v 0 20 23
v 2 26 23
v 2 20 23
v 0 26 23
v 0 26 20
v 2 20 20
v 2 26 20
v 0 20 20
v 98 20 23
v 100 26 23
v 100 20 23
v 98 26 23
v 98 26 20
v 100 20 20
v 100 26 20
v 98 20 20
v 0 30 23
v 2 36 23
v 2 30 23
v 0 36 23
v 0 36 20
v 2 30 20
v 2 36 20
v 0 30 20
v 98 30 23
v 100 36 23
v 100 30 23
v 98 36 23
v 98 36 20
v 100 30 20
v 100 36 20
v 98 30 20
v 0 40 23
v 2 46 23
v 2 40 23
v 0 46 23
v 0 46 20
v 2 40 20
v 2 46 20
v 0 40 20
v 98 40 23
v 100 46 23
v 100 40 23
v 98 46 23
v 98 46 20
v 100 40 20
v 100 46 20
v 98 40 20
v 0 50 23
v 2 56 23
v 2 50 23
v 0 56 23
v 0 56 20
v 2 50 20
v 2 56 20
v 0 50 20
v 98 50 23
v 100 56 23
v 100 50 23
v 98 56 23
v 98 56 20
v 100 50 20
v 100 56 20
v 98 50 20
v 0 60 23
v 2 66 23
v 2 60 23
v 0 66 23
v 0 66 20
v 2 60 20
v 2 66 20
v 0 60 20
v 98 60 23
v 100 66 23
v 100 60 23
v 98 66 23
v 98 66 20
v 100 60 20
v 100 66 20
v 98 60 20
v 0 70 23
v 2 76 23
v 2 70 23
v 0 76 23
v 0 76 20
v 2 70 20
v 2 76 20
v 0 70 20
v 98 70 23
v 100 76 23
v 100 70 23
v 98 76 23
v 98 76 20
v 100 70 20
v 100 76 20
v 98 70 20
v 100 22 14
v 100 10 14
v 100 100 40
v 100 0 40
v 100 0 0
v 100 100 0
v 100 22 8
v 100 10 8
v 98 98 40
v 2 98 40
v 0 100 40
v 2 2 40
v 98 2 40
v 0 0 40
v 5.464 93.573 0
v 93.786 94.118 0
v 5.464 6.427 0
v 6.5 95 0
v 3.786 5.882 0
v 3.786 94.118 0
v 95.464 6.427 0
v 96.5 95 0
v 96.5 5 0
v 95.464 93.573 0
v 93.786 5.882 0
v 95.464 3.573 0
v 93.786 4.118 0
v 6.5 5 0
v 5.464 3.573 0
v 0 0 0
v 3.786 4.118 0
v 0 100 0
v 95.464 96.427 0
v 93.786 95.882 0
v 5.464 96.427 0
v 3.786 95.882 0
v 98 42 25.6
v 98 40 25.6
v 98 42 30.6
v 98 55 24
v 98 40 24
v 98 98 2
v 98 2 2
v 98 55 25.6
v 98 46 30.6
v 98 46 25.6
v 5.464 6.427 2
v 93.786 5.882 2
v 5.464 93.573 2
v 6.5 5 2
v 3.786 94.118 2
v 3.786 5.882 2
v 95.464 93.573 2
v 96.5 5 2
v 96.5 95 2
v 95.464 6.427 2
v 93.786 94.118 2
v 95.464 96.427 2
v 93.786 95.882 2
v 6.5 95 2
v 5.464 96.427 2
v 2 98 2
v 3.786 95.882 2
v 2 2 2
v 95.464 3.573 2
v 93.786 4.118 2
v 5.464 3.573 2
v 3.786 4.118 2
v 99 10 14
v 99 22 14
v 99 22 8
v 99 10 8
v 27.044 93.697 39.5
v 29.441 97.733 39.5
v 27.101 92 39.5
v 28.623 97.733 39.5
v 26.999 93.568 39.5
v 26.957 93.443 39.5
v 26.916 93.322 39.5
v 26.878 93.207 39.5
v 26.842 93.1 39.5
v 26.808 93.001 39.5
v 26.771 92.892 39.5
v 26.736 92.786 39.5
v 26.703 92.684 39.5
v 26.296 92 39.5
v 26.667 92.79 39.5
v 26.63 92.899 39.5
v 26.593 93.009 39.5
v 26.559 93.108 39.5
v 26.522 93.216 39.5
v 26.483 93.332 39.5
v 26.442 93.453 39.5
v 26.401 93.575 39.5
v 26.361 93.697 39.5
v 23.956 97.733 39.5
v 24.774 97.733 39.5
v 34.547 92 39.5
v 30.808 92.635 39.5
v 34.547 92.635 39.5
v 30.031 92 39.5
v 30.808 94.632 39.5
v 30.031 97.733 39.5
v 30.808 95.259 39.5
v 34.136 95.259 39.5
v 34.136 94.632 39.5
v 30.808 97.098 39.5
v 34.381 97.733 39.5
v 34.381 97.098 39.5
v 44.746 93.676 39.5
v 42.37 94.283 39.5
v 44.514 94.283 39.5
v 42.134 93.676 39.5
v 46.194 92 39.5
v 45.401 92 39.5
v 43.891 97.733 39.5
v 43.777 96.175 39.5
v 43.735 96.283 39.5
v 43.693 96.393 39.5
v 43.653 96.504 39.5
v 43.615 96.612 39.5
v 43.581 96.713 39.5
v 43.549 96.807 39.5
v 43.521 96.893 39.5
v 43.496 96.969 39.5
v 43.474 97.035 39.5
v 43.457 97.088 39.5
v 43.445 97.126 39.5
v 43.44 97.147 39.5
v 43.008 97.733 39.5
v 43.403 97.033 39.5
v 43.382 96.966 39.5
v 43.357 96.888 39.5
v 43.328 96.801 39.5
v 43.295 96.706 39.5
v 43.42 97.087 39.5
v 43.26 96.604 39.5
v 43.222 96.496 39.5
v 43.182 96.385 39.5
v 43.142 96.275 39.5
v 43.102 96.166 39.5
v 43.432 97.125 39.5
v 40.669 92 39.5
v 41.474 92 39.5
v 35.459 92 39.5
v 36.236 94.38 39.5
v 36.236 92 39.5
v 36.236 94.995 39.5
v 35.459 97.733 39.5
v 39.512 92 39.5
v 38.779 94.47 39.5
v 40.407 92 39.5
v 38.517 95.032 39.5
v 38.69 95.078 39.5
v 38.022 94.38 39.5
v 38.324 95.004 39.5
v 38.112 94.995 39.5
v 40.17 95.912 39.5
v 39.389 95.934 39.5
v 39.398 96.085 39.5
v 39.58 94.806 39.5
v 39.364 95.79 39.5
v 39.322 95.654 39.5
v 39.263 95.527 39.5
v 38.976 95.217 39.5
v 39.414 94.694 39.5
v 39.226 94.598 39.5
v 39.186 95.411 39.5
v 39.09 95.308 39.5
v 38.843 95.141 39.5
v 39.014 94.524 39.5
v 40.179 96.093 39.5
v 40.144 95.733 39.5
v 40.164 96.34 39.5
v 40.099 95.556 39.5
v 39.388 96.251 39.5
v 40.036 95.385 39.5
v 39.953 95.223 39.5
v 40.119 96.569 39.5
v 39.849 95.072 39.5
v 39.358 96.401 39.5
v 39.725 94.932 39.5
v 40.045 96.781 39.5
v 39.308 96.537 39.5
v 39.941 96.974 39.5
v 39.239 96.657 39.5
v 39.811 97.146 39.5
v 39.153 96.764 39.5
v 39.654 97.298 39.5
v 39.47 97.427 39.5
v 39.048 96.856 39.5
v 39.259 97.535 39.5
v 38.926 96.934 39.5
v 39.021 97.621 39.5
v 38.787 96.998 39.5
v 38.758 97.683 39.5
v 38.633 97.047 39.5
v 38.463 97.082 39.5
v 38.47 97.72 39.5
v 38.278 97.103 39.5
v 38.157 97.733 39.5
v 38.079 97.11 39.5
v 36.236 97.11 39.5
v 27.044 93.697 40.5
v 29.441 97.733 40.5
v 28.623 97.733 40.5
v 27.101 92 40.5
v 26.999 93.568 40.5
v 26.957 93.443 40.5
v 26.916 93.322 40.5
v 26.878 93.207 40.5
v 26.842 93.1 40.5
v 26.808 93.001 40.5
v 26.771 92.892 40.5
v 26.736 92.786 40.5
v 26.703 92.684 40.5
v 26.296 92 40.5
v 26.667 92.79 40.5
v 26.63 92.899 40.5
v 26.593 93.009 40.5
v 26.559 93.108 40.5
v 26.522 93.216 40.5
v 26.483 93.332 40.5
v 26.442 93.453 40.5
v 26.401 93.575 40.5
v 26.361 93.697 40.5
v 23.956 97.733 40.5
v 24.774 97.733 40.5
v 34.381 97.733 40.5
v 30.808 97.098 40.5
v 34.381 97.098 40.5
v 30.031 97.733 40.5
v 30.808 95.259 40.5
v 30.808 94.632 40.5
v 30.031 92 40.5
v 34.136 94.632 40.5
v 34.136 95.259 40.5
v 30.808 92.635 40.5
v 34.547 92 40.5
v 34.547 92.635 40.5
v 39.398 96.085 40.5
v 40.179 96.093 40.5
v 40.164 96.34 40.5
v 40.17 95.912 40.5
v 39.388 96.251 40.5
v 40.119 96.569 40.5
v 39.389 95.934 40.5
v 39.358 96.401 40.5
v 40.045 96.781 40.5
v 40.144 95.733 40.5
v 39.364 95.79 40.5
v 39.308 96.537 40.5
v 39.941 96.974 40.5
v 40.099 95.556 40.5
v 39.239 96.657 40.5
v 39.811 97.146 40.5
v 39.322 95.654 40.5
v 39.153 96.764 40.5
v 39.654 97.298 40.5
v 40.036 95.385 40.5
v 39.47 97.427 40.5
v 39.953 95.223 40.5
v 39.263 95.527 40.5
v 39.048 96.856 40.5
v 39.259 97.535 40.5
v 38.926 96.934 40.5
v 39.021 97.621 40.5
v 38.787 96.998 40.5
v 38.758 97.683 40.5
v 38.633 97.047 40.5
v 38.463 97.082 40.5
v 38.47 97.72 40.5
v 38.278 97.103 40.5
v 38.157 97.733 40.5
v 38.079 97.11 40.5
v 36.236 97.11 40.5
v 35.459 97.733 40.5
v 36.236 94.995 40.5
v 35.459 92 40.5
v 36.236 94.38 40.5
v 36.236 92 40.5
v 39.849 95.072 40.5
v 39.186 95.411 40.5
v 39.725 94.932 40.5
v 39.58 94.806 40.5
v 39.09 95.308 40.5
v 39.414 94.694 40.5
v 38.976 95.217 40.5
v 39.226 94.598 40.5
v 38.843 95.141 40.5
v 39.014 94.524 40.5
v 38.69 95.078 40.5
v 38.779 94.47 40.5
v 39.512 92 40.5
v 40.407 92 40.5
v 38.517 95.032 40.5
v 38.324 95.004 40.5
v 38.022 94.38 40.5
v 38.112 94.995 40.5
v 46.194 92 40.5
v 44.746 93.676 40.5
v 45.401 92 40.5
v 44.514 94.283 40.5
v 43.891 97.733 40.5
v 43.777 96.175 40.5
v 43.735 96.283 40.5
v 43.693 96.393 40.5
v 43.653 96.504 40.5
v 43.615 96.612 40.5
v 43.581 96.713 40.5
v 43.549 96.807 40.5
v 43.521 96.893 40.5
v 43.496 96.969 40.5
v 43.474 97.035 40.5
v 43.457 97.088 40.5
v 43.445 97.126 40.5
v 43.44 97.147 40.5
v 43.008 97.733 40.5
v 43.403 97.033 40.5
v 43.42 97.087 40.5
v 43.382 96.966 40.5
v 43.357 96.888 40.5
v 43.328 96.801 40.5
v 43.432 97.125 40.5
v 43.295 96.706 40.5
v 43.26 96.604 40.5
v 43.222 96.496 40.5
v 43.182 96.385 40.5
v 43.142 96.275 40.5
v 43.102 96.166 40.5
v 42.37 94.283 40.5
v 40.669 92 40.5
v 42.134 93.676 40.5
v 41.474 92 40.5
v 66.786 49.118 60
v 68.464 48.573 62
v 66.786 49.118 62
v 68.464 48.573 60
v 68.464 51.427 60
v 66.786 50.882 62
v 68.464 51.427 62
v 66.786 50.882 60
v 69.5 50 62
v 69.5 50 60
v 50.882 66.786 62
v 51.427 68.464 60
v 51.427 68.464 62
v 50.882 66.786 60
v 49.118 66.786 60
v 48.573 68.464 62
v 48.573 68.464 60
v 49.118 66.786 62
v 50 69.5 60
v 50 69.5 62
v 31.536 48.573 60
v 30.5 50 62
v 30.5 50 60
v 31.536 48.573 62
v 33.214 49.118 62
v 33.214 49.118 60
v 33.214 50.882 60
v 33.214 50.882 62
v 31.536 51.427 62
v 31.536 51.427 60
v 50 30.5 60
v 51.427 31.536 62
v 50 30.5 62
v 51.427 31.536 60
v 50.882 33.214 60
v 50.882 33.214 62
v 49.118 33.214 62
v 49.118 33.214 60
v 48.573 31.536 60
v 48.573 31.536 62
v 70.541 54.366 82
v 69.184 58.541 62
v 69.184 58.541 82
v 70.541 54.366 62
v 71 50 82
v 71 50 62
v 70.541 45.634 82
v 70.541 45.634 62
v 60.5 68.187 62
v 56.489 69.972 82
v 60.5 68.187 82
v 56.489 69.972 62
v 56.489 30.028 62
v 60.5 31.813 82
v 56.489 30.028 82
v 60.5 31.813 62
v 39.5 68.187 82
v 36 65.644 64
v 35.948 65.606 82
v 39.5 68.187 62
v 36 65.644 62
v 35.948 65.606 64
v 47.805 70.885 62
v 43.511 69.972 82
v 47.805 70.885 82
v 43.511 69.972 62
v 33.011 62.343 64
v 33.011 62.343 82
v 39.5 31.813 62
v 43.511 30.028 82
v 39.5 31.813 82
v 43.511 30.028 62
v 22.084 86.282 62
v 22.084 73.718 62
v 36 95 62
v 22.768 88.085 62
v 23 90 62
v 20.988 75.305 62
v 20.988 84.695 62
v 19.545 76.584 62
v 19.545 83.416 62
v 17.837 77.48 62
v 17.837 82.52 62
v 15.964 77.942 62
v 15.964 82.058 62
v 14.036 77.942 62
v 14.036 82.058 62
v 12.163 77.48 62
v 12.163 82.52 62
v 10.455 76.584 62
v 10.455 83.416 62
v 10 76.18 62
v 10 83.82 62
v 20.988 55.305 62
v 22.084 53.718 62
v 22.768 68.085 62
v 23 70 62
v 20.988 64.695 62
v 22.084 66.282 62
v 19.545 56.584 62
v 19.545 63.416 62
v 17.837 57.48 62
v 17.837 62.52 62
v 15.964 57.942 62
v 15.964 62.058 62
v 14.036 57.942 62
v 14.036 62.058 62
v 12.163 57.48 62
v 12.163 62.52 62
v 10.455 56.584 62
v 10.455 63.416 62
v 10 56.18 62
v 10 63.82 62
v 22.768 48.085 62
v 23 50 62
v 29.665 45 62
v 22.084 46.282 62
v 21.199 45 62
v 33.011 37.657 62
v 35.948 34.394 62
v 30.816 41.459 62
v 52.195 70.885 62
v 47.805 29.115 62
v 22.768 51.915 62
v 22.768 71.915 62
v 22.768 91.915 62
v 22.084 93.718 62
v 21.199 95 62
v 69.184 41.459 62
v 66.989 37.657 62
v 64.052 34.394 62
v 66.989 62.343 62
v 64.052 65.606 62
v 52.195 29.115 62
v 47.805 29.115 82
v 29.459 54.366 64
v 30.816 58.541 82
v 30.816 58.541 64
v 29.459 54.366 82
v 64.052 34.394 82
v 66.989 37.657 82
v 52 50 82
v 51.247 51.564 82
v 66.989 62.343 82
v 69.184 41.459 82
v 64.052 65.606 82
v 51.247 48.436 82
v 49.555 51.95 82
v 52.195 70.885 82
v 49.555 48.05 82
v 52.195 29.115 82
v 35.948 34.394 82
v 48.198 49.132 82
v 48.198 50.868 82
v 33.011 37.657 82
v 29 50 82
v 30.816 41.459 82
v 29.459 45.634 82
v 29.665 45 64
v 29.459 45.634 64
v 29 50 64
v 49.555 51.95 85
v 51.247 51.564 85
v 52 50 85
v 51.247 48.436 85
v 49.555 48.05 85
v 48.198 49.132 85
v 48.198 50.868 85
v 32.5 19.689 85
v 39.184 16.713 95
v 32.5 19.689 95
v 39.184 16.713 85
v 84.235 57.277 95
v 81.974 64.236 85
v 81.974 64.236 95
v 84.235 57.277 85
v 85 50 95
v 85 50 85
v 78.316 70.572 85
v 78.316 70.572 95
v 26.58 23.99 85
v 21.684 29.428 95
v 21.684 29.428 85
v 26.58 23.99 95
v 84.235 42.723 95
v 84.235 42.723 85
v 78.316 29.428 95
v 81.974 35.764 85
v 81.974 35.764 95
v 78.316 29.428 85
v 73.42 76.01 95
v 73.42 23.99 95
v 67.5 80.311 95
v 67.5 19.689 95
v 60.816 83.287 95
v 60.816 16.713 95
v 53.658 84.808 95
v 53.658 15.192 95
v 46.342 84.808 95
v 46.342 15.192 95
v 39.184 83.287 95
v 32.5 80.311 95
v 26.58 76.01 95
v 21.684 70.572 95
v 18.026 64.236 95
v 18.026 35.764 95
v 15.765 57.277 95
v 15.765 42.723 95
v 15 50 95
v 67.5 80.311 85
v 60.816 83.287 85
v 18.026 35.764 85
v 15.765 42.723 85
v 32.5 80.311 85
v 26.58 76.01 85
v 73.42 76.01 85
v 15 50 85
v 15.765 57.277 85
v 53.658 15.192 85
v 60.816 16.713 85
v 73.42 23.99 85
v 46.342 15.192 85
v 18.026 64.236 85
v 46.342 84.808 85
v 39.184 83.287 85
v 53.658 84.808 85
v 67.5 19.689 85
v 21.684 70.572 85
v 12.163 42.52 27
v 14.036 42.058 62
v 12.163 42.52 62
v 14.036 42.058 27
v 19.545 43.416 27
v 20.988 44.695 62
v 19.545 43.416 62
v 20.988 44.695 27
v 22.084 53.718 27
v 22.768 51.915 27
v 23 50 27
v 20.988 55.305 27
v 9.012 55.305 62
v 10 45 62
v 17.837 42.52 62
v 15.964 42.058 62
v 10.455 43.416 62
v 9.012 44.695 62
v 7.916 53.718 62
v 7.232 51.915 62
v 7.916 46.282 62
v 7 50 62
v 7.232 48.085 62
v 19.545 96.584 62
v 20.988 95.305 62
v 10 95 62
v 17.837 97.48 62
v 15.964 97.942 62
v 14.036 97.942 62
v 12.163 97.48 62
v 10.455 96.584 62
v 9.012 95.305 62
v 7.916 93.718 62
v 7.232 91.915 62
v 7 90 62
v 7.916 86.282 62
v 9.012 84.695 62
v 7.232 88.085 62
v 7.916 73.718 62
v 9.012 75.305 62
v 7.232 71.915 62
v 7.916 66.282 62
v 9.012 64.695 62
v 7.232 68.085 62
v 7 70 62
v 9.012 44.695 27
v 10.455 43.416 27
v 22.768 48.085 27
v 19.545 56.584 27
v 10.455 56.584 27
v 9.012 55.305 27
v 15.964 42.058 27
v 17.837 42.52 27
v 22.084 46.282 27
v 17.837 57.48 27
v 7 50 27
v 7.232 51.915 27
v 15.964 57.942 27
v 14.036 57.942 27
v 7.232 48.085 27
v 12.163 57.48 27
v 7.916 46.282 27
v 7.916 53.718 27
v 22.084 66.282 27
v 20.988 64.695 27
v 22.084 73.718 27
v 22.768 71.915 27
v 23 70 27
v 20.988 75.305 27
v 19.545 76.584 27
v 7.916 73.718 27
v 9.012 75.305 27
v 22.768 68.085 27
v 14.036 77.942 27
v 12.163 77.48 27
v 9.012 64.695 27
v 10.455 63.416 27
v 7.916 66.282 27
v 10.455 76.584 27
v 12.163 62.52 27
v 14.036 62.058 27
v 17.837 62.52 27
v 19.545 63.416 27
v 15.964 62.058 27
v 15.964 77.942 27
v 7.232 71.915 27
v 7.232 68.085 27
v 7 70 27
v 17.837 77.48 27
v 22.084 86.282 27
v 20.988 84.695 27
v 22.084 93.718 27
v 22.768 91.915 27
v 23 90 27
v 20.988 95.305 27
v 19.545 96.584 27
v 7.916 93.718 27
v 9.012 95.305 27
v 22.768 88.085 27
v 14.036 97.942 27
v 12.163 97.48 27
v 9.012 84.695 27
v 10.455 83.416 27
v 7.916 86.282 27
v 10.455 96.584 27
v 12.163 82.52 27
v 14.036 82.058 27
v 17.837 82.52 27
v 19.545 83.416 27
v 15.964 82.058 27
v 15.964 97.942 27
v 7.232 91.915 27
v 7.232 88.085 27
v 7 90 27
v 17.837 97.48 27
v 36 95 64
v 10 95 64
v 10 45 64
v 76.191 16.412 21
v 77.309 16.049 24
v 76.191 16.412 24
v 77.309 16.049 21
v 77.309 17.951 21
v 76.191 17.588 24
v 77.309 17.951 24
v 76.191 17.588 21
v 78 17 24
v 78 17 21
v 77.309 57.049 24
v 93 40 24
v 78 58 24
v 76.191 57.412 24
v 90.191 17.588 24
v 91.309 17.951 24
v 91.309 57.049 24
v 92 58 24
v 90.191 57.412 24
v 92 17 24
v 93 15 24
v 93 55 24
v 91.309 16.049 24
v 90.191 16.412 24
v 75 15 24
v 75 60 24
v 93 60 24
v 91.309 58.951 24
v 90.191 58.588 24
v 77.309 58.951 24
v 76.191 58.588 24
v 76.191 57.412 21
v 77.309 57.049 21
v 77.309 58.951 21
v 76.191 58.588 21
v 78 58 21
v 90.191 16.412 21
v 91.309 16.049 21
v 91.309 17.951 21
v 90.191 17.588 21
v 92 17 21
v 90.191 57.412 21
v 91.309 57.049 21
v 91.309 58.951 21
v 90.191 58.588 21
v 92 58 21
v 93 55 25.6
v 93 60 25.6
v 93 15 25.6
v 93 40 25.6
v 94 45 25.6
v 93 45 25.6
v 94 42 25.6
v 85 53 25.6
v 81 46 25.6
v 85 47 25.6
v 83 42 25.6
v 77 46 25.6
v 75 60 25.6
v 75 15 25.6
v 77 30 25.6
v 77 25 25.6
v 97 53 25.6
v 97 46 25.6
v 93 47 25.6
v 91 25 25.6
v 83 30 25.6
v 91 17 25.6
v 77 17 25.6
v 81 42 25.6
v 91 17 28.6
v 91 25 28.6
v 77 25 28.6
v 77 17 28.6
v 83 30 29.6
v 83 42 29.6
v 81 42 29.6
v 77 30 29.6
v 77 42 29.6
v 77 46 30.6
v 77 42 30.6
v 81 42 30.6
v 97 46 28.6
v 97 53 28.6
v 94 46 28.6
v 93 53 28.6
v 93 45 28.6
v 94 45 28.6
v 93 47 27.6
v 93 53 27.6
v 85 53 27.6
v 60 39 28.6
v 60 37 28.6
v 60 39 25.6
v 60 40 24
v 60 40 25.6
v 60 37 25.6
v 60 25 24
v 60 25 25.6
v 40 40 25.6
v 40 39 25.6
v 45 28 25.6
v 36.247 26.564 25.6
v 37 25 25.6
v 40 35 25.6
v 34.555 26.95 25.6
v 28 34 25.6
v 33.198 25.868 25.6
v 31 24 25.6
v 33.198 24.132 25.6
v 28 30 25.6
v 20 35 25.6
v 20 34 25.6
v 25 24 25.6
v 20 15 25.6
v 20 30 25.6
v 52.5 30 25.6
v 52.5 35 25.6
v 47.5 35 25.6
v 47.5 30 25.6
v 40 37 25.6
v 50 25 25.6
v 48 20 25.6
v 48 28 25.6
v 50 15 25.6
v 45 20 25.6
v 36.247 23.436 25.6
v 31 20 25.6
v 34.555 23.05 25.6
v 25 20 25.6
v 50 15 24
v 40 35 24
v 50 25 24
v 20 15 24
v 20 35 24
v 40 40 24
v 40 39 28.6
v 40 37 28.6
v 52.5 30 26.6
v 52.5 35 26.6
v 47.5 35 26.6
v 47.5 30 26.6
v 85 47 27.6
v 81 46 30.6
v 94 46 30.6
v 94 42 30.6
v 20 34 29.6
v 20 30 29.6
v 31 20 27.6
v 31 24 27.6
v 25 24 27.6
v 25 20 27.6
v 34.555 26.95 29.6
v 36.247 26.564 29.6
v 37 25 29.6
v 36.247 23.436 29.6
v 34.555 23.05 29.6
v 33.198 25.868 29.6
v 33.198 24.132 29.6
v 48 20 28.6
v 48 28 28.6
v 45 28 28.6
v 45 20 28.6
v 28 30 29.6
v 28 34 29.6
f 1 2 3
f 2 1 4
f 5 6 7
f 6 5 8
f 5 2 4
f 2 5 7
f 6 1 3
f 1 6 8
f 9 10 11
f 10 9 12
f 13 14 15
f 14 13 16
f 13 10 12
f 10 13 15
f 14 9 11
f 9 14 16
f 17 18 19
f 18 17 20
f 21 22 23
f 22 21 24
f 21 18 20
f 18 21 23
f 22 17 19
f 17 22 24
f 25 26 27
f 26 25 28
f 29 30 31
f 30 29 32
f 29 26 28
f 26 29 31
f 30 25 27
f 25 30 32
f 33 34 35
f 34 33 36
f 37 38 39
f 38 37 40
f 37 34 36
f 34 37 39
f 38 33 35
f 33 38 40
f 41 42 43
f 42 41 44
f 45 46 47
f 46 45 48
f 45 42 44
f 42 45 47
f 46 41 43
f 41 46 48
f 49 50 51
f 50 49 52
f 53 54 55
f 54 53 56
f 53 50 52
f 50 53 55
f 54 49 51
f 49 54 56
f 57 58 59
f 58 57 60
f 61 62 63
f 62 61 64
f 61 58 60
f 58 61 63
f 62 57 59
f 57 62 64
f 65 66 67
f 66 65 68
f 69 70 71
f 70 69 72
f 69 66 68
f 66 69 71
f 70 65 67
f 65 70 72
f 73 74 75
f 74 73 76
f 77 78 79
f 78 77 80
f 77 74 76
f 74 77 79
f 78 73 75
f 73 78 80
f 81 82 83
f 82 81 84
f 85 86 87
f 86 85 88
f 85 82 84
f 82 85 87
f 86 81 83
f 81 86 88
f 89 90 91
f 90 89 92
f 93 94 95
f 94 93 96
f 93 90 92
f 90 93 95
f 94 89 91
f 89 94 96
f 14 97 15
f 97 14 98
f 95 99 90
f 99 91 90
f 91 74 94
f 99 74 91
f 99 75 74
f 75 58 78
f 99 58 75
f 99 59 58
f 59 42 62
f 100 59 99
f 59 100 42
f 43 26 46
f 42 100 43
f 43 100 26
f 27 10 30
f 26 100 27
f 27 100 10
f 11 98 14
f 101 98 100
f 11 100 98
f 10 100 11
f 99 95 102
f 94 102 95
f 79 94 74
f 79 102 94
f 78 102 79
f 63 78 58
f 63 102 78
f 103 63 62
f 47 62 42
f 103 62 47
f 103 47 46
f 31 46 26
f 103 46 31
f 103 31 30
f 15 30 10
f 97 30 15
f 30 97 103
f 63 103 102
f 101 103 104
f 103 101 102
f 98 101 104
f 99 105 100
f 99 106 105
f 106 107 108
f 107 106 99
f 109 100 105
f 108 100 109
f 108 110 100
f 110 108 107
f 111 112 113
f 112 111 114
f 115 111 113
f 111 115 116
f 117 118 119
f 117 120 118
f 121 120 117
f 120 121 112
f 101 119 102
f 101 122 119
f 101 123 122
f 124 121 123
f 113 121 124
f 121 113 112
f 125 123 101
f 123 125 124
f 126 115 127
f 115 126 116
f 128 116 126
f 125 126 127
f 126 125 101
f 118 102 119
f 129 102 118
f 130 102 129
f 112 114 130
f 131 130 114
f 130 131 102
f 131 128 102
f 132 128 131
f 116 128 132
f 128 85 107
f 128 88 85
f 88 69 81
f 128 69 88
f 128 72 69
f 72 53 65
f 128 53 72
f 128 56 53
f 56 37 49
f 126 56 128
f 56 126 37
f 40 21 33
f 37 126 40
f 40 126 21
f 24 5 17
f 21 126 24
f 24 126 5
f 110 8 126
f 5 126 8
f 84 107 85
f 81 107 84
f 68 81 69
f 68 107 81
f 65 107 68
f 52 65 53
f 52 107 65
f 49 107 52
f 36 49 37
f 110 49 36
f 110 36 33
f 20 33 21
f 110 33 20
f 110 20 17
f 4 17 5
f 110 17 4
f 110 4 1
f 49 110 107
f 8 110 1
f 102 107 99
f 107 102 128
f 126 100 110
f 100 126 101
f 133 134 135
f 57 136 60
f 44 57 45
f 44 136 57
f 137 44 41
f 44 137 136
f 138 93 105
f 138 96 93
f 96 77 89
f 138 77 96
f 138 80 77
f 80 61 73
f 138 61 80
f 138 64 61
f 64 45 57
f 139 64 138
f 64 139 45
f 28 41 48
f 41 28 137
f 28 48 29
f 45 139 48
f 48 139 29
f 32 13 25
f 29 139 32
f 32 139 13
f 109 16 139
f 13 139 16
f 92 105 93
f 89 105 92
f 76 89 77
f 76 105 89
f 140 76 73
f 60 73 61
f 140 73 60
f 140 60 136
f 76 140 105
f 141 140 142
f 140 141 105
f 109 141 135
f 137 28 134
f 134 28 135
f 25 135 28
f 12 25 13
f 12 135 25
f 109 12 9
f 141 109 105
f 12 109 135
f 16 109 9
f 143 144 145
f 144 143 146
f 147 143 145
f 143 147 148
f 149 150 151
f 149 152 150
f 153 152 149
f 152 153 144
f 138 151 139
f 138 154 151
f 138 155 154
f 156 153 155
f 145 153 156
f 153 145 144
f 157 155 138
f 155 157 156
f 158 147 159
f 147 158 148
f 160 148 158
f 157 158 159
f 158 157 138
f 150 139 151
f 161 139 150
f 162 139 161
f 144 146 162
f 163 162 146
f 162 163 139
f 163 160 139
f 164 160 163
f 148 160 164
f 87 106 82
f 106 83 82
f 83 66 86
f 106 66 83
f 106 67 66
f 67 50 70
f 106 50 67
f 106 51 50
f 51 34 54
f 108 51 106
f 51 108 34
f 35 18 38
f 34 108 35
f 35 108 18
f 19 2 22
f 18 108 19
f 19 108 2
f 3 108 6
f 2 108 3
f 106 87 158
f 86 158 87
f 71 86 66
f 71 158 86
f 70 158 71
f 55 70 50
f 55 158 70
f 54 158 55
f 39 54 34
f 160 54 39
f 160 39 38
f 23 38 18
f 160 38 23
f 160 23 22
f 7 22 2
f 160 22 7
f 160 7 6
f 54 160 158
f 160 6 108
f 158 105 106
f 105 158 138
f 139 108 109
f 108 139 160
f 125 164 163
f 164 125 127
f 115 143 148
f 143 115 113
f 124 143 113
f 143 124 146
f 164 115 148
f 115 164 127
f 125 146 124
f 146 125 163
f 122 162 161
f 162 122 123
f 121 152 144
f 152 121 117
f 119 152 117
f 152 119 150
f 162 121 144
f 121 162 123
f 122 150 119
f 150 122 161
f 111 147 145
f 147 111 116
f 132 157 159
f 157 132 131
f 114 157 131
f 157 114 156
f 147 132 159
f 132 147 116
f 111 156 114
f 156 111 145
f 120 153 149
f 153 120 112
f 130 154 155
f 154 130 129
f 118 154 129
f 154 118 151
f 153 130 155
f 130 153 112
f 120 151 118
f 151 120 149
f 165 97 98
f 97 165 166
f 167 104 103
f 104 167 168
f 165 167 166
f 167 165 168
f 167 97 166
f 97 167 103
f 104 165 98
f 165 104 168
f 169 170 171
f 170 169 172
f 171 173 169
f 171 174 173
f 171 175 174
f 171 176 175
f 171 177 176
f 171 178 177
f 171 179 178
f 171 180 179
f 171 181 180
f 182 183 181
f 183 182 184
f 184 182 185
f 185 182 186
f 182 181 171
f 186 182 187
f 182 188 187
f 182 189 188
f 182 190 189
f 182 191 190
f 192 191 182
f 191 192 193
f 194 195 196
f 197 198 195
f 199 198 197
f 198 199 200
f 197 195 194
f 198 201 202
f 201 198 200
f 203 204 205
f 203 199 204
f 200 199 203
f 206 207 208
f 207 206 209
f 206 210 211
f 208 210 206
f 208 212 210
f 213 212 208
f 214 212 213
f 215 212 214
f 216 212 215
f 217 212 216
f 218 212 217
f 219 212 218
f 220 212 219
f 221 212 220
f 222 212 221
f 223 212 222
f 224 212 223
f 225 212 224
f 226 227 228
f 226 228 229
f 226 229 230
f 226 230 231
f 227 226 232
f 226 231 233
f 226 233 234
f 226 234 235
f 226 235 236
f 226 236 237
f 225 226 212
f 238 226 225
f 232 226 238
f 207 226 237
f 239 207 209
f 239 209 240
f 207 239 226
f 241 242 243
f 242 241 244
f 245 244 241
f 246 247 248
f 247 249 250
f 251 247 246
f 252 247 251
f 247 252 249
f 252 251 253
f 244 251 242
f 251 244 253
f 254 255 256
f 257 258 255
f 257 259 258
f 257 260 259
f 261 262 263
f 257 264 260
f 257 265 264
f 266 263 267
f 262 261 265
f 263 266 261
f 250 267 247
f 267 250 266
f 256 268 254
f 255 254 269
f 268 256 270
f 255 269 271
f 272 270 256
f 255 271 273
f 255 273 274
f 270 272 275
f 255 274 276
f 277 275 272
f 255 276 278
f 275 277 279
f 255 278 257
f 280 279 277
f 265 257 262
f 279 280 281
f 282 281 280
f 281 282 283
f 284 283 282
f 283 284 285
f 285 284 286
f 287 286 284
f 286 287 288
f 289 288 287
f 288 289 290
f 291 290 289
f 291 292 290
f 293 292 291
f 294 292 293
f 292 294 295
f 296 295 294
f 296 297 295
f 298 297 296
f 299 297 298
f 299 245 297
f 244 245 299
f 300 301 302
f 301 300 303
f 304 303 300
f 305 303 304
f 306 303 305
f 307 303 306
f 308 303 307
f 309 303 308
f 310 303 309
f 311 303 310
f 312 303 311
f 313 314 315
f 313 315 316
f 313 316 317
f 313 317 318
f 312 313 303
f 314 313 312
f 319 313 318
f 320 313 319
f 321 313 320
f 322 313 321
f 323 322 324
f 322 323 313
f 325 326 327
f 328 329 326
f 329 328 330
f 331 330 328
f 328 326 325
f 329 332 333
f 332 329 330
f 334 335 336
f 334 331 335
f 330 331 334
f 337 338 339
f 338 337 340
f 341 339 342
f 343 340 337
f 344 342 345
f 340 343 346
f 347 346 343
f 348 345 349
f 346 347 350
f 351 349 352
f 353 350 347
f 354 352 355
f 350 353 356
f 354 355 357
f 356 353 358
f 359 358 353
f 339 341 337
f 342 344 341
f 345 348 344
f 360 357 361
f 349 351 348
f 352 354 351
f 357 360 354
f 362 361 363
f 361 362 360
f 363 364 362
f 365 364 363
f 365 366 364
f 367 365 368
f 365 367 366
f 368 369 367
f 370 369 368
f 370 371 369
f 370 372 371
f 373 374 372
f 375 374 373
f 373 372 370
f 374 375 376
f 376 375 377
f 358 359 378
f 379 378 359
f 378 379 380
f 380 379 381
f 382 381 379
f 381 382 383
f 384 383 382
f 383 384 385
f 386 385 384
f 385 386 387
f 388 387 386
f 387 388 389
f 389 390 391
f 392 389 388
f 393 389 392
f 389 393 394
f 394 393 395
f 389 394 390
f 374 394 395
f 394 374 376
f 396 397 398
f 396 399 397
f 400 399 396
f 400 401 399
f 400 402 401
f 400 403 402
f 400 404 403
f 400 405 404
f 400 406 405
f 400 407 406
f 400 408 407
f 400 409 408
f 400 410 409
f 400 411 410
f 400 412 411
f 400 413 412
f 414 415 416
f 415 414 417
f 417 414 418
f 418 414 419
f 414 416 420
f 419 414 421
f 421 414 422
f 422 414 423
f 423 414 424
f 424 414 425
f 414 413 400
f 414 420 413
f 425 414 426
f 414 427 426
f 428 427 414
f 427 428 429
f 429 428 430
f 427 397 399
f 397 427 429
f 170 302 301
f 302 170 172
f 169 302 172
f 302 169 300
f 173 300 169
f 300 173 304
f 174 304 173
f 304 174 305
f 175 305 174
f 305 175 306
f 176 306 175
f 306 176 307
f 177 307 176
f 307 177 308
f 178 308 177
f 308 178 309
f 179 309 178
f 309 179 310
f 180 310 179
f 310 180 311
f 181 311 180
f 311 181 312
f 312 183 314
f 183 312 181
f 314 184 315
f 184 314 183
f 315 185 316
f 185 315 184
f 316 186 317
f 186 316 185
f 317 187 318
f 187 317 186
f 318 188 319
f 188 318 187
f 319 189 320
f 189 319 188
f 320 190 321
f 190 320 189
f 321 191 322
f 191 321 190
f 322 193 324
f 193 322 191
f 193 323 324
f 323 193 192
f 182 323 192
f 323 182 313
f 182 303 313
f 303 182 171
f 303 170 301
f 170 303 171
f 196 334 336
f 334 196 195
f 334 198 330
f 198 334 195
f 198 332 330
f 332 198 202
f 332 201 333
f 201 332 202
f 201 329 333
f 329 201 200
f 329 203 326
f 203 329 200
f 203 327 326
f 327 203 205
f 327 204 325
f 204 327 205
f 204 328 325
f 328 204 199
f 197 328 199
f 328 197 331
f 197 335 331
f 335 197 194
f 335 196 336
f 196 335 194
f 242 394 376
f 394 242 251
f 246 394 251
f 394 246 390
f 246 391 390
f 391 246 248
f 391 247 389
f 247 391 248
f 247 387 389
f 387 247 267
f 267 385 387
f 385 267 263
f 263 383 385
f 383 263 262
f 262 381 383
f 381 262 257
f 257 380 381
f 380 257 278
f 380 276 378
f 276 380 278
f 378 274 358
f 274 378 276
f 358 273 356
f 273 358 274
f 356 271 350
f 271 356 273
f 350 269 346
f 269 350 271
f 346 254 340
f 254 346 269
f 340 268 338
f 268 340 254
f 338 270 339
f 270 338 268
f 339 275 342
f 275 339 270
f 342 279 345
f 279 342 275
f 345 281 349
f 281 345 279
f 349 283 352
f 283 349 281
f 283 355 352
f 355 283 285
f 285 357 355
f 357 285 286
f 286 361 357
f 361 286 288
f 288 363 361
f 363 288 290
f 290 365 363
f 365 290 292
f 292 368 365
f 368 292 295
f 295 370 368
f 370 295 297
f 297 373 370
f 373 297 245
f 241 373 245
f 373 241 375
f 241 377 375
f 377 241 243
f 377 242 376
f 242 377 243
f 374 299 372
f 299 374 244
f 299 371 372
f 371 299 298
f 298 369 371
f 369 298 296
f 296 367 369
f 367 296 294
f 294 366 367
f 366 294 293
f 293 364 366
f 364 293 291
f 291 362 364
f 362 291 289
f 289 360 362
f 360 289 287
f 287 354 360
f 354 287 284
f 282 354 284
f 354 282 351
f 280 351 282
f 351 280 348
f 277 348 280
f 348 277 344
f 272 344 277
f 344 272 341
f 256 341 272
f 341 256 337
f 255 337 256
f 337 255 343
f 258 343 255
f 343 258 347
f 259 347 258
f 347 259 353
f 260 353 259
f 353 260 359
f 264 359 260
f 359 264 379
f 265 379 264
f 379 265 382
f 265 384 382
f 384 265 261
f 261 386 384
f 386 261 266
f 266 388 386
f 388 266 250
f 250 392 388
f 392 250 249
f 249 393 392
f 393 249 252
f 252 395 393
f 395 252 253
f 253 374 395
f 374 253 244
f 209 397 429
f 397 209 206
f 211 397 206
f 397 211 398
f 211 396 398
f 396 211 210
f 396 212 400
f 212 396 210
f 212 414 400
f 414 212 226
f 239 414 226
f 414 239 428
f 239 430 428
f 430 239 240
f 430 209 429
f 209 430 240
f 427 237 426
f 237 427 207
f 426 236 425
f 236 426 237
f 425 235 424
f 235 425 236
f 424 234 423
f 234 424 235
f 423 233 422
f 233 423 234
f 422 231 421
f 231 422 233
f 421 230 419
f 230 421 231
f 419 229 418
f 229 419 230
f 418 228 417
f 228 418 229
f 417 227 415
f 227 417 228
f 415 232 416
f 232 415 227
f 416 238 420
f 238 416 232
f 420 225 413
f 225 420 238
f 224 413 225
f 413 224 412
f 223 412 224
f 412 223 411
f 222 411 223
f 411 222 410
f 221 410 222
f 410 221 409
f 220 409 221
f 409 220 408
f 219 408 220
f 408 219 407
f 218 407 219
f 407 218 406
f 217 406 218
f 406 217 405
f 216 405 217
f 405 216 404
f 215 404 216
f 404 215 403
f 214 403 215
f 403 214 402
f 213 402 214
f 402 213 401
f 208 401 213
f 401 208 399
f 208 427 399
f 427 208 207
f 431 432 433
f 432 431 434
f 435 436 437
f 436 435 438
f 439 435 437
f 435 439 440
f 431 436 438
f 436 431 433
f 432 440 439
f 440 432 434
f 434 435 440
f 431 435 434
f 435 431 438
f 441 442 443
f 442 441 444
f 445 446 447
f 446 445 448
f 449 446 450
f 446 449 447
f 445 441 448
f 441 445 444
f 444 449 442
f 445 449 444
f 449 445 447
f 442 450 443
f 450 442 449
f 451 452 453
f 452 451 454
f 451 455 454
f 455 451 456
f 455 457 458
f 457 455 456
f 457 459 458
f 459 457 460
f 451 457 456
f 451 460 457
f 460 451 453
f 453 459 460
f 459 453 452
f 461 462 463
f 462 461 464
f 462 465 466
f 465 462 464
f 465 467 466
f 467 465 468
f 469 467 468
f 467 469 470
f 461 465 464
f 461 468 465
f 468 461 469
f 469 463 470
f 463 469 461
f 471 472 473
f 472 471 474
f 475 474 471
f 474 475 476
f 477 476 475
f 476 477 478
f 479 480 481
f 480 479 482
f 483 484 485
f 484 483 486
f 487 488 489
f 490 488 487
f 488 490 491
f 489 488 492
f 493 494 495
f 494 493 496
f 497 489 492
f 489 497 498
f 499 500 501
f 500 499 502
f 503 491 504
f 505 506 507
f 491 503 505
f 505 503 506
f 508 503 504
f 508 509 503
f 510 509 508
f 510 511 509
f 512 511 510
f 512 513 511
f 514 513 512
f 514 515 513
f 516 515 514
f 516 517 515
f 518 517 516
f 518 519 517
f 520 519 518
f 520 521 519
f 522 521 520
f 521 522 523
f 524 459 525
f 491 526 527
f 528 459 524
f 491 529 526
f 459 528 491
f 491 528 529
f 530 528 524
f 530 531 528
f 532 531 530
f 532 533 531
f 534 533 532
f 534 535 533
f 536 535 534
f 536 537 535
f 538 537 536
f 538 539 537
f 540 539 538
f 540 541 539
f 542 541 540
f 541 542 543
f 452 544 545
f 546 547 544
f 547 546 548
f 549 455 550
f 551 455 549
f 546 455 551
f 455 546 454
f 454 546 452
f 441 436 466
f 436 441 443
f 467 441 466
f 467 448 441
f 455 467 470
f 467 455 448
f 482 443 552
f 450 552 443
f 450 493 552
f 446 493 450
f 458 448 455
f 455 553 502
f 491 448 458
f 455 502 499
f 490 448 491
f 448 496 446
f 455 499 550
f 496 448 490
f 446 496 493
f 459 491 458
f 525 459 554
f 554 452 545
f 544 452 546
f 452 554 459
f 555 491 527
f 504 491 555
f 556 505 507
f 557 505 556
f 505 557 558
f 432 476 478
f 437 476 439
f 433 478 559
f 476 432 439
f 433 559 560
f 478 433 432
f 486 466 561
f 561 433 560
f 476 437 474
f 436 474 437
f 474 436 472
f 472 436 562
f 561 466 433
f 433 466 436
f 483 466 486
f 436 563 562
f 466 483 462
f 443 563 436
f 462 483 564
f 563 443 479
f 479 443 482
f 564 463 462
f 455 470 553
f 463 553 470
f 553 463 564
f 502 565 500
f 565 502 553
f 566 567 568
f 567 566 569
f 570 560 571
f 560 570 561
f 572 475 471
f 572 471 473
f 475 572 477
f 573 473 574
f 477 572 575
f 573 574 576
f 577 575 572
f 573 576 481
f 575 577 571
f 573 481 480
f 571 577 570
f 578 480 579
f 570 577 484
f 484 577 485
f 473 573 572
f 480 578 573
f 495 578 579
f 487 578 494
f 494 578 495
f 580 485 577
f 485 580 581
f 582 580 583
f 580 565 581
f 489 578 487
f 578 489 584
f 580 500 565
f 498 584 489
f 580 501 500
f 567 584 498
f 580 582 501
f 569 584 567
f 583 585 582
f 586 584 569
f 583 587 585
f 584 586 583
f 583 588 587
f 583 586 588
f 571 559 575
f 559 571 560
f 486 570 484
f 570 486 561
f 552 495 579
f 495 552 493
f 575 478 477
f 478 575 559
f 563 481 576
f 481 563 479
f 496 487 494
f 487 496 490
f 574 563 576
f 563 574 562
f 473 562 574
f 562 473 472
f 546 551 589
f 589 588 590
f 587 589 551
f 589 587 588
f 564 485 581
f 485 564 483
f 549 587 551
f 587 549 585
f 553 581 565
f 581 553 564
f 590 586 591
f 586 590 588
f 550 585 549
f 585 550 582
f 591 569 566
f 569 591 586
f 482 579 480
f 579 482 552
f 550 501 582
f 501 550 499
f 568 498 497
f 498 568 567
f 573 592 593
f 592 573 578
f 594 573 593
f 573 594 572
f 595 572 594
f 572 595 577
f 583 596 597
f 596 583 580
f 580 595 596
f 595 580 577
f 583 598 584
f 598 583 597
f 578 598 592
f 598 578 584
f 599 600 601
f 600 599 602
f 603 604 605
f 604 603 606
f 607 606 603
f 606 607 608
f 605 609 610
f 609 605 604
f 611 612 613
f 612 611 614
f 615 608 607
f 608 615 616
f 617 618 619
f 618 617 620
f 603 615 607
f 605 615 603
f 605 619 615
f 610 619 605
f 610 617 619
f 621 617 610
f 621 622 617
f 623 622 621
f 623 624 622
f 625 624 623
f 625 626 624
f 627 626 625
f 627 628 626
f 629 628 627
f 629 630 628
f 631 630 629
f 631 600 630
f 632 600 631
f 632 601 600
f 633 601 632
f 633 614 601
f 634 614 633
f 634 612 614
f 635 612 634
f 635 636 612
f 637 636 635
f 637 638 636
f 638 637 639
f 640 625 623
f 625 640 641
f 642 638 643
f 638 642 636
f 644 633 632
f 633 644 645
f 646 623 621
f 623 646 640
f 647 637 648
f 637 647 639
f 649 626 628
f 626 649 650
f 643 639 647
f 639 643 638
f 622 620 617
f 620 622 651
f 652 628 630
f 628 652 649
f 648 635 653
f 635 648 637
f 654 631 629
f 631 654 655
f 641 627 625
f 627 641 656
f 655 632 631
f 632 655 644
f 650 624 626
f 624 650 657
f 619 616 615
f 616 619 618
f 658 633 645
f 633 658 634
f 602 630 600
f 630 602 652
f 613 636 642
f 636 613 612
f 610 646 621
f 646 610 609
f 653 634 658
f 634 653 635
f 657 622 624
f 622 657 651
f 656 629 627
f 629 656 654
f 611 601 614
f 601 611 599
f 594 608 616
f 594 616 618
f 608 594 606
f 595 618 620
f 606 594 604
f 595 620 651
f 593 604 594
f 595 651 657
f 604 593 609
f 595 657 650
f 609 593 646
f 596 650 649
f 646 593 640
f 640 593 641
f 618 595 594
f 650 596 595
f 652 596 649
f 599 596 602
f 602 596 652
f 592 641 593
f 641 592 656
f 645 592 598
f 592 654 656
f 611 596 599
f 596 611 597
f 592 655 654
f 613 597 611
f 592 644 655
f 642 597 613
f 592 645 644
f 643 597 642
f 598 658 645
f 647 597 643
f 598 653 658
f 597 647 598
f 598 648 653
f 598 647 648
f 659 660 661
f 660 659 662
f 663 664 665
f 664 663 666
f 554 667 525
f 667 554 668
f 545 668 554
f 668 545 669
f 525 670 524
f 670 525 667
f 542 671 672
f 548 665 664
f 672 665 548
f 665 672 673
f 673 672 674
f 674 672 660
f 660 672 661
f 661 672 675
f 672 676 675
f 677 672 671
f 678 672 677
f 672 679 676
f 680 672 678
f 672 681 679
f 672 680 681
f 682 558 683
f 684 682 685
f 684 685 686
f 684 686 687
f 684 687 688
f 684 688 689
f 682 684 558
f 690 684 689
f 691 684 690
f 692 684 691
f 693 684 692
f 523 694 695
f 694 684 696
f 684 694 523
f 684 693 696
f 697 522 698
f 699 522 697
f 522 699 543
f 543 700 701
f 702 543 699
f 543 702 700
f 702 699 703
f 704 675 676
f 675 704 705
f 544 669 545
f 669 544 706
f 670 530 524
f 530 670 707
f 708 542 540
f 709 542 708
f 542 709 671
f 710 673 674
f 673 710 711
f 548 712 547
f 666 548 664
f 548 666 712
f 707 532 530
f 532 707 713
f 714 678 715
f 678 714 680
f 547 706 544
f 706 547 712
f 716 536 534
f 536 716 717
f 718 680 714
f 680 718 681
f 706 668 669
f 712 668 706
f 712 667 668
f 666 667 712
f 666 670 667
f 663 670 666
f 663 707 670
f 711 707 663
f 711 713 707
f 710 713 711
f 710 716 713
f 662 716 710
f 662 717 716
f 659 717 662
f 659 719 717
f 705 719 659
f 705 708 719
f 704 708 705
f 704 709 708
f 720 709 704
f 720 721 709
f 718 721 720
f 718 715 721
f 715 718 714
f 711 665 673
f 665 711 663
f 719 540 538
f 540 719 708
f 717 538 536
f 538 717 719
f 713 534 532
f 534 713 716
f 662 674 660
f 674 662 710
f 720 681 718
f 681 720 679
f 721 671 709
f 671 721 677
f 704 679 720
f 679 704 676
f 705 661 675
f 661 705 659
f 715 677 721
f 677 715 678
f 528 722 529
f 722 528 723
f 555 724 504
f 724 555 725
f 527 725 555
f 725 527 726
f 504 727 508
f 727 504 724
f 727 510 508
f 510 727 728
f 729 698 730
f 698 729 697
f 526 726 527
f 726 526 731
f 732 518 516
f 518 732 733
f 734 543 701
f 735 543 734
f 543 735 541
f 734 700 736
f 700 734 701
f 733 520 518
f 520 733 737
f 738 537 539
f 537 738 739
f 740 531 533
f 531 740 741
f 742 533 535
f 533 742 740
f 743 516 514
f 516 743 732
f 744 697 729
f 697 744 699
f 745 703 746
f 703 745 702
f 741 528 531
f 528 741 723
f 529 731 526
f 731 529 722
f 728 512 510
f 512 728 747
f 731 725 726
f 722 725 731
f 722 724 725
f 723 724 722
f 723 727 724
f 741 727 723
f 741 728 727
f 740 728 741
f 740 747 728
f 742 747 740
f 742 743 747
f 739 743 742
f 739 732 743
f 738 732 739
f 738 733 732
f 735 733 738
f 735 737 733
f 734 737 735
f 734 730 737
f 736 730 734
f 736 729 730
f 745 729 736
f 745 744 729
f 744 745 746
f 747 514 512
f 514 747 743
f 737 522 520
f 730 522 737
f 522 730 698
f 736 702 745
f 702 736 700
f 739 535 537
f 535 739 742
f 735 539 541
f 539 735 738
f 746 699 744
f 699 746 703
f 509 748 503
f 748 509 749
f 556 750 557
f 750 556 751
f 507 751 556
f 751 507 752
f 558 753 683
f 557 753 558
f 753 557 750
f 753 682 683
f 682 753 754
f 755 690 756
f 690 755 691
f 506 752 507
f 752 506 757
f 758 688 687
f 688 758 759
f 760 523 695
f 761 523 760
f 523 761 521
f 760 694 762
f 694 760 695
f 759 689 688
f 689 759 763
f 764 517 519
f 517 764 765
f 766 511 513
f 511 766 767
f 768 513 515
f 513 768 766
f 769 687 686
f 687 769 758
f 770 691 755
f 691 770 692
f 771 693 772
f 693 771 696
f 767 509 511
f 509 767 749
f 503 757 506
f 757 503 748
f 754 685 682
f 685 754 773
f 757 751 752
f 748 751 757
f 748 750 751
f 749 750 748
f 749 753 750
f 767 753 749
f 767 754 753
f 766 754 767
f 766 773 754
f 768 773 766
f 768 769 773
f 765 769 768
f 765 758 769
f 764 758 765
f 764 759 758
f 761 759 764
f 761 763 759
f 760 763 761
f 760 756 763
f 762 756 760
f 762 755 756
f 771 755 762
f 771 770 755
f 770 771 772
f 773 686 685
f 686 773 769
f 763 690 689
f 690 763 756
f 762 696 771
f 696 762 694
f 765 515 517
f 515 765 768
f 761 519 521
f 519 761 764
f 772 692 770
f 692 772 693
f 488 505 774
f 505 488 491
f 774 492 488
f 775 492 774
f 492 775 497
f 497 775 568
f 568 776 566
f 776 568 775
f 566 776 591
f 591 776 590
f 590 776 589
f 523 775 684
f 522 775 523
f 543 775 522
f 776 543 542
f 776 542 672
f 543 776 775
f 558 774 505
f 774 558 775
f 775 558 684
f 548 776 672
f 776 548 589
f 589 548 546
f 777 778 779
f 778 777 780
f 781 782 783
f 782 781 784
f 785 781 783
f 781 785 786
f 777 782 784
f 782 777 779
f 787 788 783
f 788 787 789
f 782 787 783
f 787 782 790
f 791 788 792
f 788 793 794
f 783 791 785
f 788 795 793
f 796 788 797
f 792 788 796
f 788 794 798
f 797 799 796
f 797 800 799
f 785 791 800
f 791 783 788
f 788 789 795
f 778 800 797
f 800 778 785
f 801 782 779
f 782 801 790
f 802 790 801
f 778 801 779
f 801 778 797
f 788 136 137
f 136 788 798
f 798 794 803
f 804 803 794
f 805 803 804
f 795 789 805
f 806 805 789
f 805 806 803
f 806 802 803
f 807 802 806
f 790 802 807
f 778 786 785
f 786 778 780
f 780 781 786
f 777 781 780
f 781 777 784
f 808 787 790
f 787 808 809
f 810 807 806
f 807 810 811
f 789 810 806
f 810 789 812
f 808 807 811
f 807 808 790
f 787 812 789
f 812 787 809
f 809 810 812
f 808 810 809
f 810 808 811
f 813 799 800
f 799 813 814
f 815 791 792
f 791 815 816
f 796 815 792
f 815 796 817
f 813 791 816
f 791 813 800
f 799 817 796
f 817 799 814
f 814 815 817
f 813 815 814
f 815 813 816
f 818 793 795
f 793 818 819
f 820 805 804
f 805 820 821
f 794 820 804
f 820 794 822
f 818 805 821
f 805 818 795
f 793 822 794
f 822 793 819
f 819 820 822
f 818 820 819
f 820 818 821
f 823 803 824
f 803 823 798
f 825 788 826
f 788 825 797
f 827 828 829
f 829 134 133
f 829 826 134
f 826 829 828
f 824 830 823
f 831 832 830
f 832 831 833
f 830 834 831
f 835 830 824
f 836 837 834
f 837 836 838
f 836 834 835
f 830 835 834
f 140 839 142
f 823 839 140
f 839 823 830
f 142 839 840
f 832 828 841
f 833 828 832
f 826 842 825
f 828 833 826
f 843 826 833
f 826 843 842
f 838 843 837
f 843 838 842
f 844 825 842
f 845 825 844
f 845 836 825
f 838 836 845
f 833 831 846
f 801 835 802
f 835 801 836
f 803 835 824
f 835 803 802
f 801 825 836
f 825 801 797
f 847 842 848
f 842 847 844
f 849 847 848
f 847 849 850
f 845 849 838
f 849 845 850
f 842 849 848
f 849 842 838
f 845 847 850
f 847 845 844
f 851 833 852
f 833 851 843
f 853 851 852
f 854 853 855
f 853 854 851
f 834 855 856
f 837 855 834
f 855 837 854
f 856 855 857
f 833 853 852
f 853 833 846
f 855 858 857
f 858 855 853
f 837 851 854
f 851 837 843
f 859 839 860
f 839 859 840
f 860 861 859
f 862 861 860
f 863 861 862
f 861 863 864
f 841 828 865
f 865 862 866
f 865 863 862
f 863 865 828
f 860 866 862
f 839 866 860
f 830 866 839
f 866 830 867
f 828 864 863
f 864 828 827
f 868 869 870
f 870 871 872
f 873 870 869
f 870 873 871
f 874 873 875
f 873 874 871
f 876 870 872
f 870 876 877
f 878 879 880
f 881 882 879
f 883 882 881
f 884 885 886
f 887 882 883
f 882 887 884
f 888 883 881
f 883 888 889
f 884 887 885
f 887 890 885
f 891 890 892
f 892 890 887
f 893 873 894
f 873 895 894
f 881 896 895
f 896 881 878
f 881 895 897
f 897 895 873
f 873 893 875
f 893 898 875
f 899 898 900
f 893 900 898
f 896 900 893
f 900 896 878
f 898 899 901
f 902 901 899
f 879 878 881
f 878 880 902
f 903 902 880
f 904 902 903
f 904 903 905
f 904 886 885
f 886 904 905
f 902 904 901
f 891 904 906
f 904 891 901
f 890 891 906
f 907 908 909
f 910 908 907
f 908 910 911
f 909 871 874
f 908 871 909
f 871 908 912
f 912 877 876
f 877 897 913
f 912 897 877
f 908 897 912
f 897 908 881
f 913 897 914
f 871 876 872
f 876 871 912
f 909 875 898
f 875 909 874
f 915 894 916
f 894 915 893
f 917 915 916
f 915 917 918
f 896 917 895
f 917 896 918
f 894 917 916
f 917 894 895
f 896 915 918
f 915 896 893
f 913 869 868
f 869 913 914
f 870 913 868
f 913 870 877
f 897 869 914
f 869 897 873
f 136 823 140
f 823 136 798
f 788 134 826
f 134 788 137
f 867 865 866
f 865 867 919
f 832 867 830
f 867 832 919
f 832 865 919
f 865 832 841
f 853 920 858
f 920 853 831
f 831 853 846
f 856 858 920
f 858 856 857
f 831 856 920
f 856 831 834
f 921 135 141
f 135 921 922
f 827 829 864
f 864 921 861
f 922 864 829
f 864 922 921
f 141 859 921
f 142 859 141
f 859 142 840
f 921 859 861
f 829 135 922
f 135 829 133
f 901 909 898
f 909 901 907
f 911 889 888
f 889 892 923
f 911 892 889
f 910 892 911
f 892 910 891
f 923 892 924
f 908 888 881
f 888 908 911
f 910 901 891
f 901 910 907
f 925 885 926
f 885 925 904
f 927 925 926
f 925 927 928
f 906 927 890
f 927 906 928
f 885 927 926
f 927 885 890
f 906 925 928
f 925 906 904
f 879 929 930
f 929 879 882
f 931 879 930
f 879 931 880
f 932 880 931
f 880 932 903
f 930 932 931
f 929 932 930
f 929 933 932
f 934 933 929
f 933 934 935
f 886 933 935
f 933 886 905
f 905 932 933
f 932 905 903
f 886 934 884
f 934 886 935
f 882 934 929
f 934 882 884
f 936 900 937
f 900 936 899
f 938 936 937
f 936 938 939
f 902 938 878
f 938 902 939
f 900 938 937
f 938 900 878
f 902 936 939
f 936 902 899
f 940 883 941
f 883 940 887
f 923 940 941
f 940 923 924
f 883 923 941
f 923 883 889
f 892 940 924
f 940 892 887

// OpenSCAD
// VERA CubeSat Subsystem Parameters
housing_width = 100;
housing_length = 100;
housing_height = 40;
wall_thickness = 2;
exploded = true; // Set to true for exploded view

// Component dimensions
flywheel_diameter = 70;
flywheel_thickness = 10;
motor_diameter = 42;
motor_height = 20;
supercap_diameter = 16;
supercap_height = 35;
arduino_width = 18;
arduino_length = 45;
arduino_thickness = 1.6;

// Assembly
if (exploded) {
    exploded_assembly();
} else {
    assembled_system();
}

module assembled_system() {
    // Main housing
    main_housing();
    
    // Internal components
    translate([0, 0, wall_thickness]) {
        // Motor and flywheel at center
        translate([housing_width/2, housing_length/2, 0])
        motor_flywheel_assembly();
        
        // Supercapacitor bank
        translate([15, housing_length/2, 5])
        supercapacitor_bank();
        
        // Arduino board
        translate([housing_width-25, 15, 2])
        arduino_board();
        
        // IMU sensor
        translate([housing_width/2-10, housing_length/2-25, 2])
        imu_sensor();
        
        // Current sensor
        translate([housing_width/2+25, housing_length/2-10, 2])
        current_sensor();
        
        // Power conditioning PCB
        translate([20, 15, 2])
        power_pcb();
    }
}

module exploded_assembly() {
    // Housing
    main_housing();
    
    // Components with offset positions
    translate([0, 0, wall_thickness + 60]) {
        translate([housing_width/2, housing_length/2, 0])
        motor_flywheel_assembly();
    }
    
    translate([0, 0, wall_thickness + 20]) {
        translate([15, housing_length/2, 5])
        supercapacitor_bank();
        
        translate([housing_width-25, 15, 2])
        arduino_board();
        
        translate([housing_width/2-10, housing_length/2-25, 2])
        imu_sensor();
        
        translate([housing_width/2+25, housing_length/2-10, 2])
        current_sensor();
        
        translate([20, 15, 2])
        power_pcb();
    }
}

module main_housing() {
    difference() {
        // Main body
        cube([housing_width, housing_length, housing_height]);
        
        // Internal cavity
        translate([wall_thickness, wall_thickness, wall_thickness])
        cube([housing_width-2*wall_thickness, housing_length-2*wall_thickness, housing_height]);
        
        // Ventilation slots on sides
        for (i = [0:5]) {
            translate([-1, 20+i*10, housing_height/2])
            cube([wall_thickness+2, 6, 3]);
            
            translate([housing_width-wall_thickness-1, 20+i*10, housing_height/2])
            cube([wall_thickness+2, 6, 3]);
        }
        
        // M3 mounting holes at corners
        translate([5, 5, -1])
        cylinder(h=wall_thickness+2, r=1.5);
        
        translate([housing_width-5, 5, -1])
        cylinder(h=wall_thickness+2, r=1.5);
        
        translate([5, housing_length-5, -1])
        cylinder(h=wall_thickness+2, r=1.5);
        
        translate([housing_width-5, housing_length-5, -1])
        cylinder(h=wall_thickness+2, r=1.5);
        
        // USB port slot for Arduino
        translate([housing_width-1, 10, 8])
        cube([wall_thickness+2, 12, 6]);
    }
    
    // VERA label (raised text)
    translate([housing_width/2-15, housing_length-8, housing_height-0.5])
    linear_extrude(height=1)
    text("VERA", size=6, halign="center");
}

module motor_flywheel_assembly() {
    // BLDC Motor
    cylinder(h=motor_height, r=motor_diameter/2);
    
    // Motor shaft
    translate([0, 0, motor_height])
    cylinder(h=5, r=2);
    
    // Flywheel
    translate([0, 0, motor_height+3])
    cylinder(h=flywheel_thickness, r=flywheel_diameter/2);
    
    // Motor mounting screws
    for (angle = [0:90:270]) {
        rotate([0, 0, angle])
        translate([motor_diameter/2-3, 0, -2])
        cylinder(h=4, r=1.5);
    }
}

module supercapacitor_bank() {
    for (i = [0:2]) {
        translate([0, i*20, 0])
        cylinder(h=supercap_height, r=supercap_diameter/2);
    }
    
    // Connection PCB
    translate([-5, -5, supercap_height])
    cube([supercap_diameter+10, 50, 2]);
}

module arduino_board() {
    // PCB
    cube([arduino_width, arduino_length, arduino_thickness]);
    
    // Components on top
    translate([2, 2, arduino_thickness])
    cube([14, 8, 3]);
    
    translate([2, 15, arduino_thickness])
    cube([6, 12, 4]);
    
    // USB connector
    translate([arduino_width, 30, arduino_thickness])
    cube([4, 8, 3]);
    
    // Standoffs
    for (pos = [[2, 2], [2, arduino_length-2], [arduino_width-2, 2], [arduino_width-2, arduino_length-2]]) {
        translate([pos[0], pos[1], -3])
        cylinder(h=3, r=1);
    }
}

module imu_sensor() {
    // MPU6050 breakout board
    cube([20, 15, 1.6]);
    
    // Sensor IC
    translate([7.5, 5, 1.6])
    cube([5, 5, 1]);
    
    // Pin headers
    translate([0, 12, 1.6])
    cube([20, 2, 3]);
}

module current_sensor() {
    // ACS712 breakout board
    cube([25, 15, 1.6]);
    
    // Sensor IC
    translate([10, 7, 1.6])
    cube([8, 6, 2]);
    
    // Terminal blocks
    translate([2, 2, 1.6])
    cube([4, 4, 5]);
    
    translate([19, 2, 1.6])
    cube([4, 4, 5]);
}

module power_pcb() {
    // Power conditioning PCB
    cube([30, 20, 1.6]);
    
    // Components
    translate([5, 5, 1.6])
    cube([6, 4, 2]); // Buck-boost IC
    
    translate([15, 10, 1.6])
    cylinder(h=4, r=2); // Inductor
    
    translate([25, 5, 1.6])
    cube([3, 8, 3]); // Capacitors
    
    // Connectors
    translate([0, 15, 1.6])
    cube([8, 4, 4]);
}
